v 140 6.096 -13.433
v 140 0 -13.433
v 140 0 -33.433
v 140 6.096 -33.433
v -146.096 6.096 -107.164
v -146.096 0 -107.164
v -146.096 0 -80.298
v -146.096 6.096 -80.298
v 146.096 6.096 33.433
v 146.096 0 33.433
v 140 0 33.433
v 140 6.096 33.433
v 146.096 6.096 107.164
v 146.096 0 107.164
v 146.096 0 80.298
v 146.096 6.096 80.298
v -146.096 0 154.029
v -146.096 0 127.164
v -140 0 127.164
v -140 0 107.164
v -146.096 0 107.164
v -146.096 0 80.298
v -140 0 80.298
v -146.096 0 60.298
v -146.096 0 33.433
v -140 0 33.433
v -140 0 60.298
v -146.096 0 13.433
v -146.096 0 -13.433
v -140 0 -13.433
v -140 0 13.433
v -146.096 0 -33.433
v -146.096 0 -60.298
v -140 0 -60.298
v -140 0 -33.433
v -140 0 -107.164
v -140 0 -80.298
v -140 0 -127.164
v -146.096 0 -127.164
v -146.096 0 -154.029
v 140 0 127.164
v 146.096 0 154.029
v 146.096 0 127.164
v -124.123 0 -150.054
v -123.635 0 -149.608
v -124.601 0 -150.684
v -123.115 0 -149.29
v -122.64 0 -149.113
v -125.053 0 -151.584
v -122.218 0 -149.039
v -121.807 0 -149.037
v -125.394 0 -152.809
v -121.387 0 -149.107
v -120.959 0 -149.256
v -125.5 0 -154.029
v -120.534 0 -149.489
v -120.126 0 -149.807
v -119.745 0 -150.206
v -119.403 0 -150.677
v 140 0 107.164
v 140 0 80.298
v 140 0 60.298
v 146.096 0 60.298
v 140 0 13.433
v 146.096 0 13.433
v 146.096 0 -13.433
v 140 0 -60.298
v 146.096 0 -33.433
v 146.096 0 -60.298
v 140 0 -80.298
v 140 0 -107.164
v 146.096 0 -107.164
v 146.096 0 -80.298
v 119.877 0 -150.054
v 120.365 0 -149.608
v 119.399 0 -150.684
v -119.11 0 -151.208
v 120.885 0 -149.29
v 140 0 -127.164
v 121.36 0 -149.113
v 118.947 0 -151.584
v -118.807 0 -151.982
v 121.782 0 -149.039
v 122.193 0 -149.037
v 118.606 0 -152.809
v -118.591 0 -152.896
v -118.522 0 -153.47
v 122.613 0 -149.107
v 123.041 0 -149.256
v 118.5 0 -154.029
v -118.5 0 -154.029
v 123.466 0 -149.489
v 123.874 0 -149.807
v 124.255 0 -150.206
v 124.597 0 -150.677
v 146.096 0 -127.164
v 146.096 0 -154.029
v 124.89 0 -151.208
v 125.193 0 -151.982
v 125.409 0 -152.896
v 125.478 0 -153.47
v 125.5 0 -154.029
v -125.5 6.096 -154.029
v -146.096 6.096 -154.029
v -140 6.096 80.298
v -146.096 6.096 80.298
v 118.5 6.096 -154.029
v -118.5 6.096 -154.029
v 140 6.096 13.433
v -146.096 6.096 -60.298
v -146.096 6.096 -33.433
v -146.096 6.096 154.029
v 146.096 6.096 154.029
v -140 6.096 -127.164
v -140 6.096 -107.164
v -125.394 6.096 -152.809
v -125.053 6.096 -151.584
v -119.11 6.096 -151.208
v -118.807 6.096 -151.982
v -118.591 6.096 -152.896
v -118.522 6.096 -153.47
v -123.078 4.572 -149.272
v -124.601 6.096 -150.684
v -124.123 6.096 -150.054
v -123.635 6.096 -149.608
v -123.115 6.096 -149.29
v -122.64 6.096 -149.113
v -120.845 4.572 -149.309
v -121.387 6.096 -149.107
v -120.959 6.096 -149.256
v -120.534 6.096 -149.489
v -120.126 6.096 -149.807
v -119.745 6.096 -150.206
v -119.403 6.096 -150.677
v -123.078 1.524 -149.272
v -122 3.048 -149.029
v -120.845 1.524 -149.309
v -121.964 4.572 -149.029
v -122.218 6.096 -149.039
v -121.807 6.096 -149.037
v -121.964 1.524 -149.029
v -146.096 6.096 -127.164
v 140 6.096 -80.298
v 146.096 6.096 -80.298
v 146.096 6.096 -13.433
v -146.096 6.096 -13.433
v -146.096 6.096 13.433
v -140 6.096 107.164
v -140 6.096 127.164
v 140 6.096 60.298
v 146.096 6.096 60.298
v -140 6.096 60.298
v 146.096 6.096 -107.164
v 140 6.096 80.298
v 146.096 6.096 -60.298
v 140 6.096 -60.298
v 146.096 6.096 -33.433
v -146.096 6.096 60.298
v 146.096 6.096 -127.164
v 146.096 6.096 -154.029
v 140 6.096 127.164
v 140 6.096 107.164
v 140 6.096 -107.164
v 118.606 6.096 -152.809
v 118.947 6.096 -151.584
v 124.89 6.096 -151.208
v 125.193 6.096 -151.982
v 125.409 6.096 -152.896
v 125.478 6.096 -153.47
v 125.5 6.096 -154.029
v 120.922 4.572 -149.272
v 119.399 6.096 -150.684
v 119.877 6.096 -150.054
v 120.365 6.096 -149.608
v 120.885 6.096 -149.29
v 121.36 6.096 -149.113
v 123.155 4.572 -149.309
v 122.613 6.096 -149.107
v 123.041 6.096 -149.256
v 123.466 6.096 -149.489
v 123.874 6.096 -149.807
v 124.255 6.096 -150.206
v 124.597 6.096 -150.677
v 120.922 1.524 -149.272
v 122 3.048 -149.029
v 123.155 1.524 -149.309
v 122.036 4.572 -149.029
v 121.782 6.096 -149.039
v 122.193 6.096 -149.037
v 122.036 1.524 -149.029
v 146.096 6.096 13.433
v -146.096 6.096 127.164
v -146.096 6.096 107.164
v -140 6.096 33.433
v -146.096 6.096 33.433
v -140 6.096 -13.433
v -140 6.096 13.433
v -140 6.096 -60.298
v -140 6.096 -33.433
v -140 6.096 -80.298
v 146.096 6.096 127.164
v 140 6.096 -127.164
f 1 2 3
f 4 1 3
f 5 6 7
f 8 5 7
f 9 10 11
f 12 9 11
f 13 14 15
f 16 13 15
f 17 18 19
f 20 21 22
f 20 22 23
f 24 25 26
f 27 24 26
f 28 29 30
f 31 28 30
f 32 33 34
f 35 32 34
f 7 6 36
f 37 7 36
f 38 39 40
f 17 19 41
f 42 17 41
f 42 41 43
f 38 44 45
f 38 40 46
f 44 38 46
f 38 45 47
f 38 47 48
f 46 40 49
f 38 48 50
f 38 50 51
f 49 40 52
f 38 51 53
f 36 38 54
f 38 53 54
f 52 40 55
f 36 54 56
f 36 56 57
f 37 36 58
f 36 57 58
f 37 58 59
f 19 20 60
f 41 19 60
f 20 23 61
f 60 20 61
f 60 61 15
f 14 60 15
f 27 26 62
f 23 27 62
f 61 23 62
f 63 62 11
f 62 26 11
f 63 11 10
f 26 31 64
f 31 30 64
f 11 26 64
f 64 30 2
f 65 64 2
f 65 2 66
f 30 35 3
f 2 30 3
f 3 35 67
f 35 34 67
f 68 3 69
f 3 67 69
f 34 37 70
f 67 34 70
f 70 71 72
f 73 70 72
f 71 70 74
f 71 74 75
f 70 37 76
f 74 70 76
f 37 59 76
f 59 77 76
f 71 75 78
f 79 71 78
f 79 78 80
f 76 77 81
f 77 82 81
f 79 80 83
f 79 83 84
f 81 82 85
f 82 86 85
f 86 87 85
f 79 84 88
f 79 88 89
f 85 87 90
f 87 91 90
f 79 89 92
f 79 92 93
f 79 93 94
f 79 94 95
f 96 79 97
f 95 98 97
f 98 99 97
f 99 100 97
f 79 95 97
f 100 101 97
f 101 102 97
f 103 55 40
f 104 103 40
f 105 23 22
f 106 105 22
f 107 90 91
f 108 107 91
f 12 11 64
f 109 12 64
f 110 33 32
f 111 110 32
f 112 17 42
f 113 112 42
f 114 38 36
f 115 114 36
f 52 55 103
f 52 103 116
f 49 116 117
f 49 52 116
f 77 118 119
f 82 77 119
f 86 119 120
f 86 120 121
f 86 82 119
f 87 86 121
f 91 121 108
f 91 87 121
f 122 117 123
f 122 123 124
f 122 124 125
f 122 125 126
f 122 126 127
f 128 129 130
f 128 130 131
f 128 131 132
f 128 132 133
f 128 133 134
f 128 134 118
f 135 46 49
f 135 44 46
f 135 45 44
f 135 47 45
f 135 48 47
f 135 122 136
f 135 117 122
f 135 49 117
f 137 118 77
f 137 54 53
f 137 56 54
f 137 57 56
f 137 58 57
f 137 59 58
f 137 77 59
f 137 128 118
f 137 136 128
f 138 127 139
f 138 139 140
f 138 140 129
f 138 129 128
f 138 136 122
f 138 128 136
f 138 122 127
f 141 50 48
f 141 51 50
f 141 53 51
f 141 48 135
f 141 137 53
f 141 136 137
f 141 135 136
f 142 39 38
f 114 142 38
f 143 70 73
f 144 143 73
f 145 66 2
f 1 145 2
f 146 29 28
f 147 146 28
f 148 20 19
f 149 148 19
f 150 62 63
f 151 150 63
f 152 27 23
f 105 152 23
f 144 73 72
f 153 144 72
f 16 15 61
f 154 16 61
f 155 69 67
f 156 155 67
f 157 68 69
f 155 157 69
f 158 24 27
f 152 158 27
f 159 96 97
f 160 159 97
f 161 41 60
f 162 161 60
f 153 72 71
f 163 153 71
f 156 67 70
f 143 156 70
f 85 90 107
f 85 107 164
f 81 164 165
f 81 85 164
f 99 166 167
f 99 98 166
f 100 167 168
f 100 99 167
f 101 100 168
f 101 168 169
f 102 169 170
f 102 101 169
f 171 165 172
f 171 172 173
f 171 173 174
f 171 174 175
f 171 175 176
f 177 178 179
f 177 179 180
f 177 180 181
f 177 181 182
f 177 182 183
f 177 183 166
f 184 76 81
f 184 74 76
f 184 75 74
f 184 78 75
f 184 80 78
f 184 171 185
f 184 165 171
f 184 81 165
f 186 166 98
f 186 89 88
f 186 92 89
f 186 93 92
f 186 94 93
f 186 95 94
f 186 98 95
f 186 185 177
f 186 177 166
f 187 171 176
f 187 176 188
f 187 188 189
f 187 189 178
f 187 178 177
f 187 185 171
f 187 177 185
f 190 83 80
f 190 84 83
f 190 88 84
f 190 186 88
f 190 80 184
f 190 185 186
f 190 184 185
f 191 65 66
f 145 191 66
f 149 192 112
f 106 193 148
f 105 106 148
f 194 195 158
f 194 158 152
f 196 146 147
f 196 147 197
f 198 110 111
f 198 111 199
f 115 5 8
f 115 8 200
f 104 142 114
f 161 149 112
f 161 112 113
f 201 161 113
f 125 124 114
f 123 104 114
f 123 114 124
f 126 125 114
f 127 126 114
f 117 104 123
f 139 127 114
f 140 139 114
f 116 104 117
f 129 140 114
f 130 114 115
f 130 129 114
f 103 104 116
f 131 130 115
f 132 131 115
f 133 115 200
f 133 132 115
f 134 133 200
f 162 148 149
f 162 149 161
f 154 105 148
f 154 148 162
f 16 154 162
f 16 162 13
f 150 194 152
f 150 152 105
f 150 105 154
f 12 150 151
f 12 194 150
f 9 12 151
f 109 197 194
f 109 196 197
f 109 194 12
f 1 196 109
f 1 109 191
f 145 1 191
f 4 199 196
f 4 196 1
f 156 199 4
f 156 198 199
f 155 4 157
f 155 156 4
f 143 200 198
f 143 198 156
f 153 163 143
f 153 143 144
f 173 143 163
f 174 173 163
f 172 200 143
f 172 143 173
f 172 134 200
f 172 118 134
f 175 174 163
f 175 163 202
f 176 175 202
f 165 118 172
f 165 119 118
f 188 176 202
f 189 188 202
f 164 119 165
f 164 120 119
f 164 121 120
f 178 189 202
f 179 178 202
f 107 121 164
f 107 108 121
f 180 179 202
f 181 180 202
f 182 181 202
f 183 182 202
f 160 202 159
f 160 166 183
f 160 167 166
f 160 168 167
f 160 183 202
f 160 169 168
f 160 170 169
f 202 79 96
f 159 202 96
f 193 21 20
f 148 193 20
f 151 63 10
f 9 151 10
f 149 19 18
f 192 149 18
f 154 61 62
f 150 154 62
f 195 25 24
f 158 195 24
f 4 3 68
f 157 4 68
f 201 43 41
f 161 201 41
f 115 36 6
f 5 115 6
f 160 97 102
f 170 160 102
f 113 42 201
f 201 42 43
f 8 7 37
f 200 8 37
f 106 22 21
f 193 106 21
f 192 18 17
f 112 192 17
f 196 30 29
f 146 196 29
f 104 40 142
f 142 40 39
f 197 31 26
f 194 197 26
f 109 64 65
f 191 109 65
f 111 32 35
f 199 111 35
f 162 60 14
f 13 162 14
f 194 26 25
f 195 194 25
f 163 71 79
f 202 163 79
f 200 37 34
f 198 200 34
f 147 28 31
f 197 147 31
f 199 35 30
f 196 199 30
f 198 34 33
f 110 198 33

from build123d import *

# Parameters (mm, degrees)
BOSS_EXTRUDE1_DEPTH = 6.096


with BuildPart() as part:
    # Sketch1 → Boss-Extrude1 (new body)
    with BuildSketch(Plane(origin=(0, 0, 0), x_dir=(1, 0, 0), z_dir=(0, 1, 0))):
        with BuildLine():
            Line((-146.096, 127.163727148), (-140, 127.163727148))
            Line((-140, 127.163727148), (-140, 107.163727148))
            Line((-140, 107.163727148), (-146.096, 107.163727148))
            Line((-146.096, 107.163727148), (-146.096, 80.298236289))
            Line((-146.096, 80.298236289), (-140, 80.298236289))
            Line((-140, 80.298236289), (-140, 60.298236289))
            Line((-140, 60.298236289), (-146.096, 60.298236289))
            Line((-146.096, 60.298236289), (-146.096, 33.43274543))
            Line((-146.096, 33.43274543), (-140, 33.43274543))
            Line((-140, 33.43274543), (-140, 13.43274543))
            Line((-140, 13.43274543), (-146.096, 13.43274543))
            Line((-146.096, 13.43274543), (-146.096, -13.43274543))
            Line((-146.096, -13.43274543), (-140, -13.43274543))
            Line((-140, -13.43274543), (-140, -33.43274543))
            Line((-140, -33.43274543), (-146.096, -33.43274543))
            Line((-146.096, -33.43274543), (-146.096, -60.298236289))
            Line((-146.096, -60.298236289), (-140, -60.298236289))
            Line((-140, -60.298236289), (-140, -80.298236289))
            Line((-140, -80.298236289), (-146.096, -80.298236289))
            Line((-146.096, -80.298236289), (-146.096, -107.163727148))
            Line((-146.096, -107.163727148), (-140, -107.163727148))
            Line((-140, -107.163727148), (-140, -127.163727148))
            Line((-140, -127.163727148), (-146.096, -127.163727148))
            Line((-146.096, -127.163727148), (-146.096, -154.029218007))
            Line((-146.096, -154.029218007), (146.096, -154.029218007))
            Line((146.096, -154.029218007), (146.096, -127.163727148))
            Line((146.096, -127.163727148), (140, -127.163727148))
            Line((140, -127.163727148), (140, -107.163727148))
            Line((140, -107.163727148), (146.096, -107.163727148))
            Line((146.096, -107.163727148), (146.096, -80.298236289))
            Line((146.096, -80.298236289), (140, -80.298236289))
            Line((140, -80.298236289), (140, -60.298236289))
            Line((140, -60.298236289), (146.096, -60.298236289))
            Line((146.096, -60.298236289), (146.096, -33.43274543))
            Line((146.096, -33.43274543), (140, -33.43274543))
            Line((140, -33.43274543), (140, -13.43274543))
            Line((140, -13.43274543), (146.096, -13.43274543))
            Line((146.096, -13.43274543), (146.096, 13.43274543))
            Line((146.096, 13.43274543), (140, 13.43274543))
            Line((140, 13.43274543), (140, 33.43274543))
            Line((140, 33.43274543), (146.096, 33.43274543))
            Line((146.096, 33.43274543), (146.096, 60.298236289))
            Line((146.096, 60.298236289), (140, 60.298236289))
            Line((140, 60.298236289), (140, 80.298236289))
            Line((140, 80.298236289), (146.096, 80.298236289))
            Line((146.096, 80.298236289), (146.096, 107.163727148))
            Line((146.096, 107.163727148), (140, 107.163727148))
            Line((140, 107.163727148), (140, 127.163727148))
            Line((140, 127.163727148), (146.096, 127.163727148))
            Line((146.096, 127.163727148), (146.096, 154.029218007))
            Line((146.096, 154.029218007), (125.5, 154.029218007))
            add(Edge.make_bspline(
                [(118.5, 154.029218007), (118.5, 149.029218007), (122, 149.029218007), (125.5, 149.029218007), (125.5, 154.029218007)],
                knots=[1.570796327, 1.570796327, 1.570796327, 3.141592654, 3.141592654, 4.71238898, 4.71238898, 4.71238898], degree=2, weights=[1, 0.707106781, 1, 0.707106781, 1]))
            Line((118.5, 154.029218007), (-118.5, 154.029218007))
            add(Edge.make_bspline(
                [(-125.5, 154.029218007), (-125.5, 149.029218007), (-122, 149.029218007), (-118.5, 149.029218007), (-118.5, 154.029218007)],
                knots=[4.71238898, 4.71238898, 4.71238898, 6.283185307, 6.283185307, 7.853981634, 7.853981634, 7.853981634], degree=2, weights=[1, 0.707106781, 1, 0.707106781, 1]))
            Line((-125.5, 154.029218007), (-146.096, 154.029218007))
            Line((-146.096, 154.029218007), (-146.096, 127.163727148))
        make_face()
    extrude(amount=BOSS_EXTRUDE1_DEPTH)


solid = part.part
